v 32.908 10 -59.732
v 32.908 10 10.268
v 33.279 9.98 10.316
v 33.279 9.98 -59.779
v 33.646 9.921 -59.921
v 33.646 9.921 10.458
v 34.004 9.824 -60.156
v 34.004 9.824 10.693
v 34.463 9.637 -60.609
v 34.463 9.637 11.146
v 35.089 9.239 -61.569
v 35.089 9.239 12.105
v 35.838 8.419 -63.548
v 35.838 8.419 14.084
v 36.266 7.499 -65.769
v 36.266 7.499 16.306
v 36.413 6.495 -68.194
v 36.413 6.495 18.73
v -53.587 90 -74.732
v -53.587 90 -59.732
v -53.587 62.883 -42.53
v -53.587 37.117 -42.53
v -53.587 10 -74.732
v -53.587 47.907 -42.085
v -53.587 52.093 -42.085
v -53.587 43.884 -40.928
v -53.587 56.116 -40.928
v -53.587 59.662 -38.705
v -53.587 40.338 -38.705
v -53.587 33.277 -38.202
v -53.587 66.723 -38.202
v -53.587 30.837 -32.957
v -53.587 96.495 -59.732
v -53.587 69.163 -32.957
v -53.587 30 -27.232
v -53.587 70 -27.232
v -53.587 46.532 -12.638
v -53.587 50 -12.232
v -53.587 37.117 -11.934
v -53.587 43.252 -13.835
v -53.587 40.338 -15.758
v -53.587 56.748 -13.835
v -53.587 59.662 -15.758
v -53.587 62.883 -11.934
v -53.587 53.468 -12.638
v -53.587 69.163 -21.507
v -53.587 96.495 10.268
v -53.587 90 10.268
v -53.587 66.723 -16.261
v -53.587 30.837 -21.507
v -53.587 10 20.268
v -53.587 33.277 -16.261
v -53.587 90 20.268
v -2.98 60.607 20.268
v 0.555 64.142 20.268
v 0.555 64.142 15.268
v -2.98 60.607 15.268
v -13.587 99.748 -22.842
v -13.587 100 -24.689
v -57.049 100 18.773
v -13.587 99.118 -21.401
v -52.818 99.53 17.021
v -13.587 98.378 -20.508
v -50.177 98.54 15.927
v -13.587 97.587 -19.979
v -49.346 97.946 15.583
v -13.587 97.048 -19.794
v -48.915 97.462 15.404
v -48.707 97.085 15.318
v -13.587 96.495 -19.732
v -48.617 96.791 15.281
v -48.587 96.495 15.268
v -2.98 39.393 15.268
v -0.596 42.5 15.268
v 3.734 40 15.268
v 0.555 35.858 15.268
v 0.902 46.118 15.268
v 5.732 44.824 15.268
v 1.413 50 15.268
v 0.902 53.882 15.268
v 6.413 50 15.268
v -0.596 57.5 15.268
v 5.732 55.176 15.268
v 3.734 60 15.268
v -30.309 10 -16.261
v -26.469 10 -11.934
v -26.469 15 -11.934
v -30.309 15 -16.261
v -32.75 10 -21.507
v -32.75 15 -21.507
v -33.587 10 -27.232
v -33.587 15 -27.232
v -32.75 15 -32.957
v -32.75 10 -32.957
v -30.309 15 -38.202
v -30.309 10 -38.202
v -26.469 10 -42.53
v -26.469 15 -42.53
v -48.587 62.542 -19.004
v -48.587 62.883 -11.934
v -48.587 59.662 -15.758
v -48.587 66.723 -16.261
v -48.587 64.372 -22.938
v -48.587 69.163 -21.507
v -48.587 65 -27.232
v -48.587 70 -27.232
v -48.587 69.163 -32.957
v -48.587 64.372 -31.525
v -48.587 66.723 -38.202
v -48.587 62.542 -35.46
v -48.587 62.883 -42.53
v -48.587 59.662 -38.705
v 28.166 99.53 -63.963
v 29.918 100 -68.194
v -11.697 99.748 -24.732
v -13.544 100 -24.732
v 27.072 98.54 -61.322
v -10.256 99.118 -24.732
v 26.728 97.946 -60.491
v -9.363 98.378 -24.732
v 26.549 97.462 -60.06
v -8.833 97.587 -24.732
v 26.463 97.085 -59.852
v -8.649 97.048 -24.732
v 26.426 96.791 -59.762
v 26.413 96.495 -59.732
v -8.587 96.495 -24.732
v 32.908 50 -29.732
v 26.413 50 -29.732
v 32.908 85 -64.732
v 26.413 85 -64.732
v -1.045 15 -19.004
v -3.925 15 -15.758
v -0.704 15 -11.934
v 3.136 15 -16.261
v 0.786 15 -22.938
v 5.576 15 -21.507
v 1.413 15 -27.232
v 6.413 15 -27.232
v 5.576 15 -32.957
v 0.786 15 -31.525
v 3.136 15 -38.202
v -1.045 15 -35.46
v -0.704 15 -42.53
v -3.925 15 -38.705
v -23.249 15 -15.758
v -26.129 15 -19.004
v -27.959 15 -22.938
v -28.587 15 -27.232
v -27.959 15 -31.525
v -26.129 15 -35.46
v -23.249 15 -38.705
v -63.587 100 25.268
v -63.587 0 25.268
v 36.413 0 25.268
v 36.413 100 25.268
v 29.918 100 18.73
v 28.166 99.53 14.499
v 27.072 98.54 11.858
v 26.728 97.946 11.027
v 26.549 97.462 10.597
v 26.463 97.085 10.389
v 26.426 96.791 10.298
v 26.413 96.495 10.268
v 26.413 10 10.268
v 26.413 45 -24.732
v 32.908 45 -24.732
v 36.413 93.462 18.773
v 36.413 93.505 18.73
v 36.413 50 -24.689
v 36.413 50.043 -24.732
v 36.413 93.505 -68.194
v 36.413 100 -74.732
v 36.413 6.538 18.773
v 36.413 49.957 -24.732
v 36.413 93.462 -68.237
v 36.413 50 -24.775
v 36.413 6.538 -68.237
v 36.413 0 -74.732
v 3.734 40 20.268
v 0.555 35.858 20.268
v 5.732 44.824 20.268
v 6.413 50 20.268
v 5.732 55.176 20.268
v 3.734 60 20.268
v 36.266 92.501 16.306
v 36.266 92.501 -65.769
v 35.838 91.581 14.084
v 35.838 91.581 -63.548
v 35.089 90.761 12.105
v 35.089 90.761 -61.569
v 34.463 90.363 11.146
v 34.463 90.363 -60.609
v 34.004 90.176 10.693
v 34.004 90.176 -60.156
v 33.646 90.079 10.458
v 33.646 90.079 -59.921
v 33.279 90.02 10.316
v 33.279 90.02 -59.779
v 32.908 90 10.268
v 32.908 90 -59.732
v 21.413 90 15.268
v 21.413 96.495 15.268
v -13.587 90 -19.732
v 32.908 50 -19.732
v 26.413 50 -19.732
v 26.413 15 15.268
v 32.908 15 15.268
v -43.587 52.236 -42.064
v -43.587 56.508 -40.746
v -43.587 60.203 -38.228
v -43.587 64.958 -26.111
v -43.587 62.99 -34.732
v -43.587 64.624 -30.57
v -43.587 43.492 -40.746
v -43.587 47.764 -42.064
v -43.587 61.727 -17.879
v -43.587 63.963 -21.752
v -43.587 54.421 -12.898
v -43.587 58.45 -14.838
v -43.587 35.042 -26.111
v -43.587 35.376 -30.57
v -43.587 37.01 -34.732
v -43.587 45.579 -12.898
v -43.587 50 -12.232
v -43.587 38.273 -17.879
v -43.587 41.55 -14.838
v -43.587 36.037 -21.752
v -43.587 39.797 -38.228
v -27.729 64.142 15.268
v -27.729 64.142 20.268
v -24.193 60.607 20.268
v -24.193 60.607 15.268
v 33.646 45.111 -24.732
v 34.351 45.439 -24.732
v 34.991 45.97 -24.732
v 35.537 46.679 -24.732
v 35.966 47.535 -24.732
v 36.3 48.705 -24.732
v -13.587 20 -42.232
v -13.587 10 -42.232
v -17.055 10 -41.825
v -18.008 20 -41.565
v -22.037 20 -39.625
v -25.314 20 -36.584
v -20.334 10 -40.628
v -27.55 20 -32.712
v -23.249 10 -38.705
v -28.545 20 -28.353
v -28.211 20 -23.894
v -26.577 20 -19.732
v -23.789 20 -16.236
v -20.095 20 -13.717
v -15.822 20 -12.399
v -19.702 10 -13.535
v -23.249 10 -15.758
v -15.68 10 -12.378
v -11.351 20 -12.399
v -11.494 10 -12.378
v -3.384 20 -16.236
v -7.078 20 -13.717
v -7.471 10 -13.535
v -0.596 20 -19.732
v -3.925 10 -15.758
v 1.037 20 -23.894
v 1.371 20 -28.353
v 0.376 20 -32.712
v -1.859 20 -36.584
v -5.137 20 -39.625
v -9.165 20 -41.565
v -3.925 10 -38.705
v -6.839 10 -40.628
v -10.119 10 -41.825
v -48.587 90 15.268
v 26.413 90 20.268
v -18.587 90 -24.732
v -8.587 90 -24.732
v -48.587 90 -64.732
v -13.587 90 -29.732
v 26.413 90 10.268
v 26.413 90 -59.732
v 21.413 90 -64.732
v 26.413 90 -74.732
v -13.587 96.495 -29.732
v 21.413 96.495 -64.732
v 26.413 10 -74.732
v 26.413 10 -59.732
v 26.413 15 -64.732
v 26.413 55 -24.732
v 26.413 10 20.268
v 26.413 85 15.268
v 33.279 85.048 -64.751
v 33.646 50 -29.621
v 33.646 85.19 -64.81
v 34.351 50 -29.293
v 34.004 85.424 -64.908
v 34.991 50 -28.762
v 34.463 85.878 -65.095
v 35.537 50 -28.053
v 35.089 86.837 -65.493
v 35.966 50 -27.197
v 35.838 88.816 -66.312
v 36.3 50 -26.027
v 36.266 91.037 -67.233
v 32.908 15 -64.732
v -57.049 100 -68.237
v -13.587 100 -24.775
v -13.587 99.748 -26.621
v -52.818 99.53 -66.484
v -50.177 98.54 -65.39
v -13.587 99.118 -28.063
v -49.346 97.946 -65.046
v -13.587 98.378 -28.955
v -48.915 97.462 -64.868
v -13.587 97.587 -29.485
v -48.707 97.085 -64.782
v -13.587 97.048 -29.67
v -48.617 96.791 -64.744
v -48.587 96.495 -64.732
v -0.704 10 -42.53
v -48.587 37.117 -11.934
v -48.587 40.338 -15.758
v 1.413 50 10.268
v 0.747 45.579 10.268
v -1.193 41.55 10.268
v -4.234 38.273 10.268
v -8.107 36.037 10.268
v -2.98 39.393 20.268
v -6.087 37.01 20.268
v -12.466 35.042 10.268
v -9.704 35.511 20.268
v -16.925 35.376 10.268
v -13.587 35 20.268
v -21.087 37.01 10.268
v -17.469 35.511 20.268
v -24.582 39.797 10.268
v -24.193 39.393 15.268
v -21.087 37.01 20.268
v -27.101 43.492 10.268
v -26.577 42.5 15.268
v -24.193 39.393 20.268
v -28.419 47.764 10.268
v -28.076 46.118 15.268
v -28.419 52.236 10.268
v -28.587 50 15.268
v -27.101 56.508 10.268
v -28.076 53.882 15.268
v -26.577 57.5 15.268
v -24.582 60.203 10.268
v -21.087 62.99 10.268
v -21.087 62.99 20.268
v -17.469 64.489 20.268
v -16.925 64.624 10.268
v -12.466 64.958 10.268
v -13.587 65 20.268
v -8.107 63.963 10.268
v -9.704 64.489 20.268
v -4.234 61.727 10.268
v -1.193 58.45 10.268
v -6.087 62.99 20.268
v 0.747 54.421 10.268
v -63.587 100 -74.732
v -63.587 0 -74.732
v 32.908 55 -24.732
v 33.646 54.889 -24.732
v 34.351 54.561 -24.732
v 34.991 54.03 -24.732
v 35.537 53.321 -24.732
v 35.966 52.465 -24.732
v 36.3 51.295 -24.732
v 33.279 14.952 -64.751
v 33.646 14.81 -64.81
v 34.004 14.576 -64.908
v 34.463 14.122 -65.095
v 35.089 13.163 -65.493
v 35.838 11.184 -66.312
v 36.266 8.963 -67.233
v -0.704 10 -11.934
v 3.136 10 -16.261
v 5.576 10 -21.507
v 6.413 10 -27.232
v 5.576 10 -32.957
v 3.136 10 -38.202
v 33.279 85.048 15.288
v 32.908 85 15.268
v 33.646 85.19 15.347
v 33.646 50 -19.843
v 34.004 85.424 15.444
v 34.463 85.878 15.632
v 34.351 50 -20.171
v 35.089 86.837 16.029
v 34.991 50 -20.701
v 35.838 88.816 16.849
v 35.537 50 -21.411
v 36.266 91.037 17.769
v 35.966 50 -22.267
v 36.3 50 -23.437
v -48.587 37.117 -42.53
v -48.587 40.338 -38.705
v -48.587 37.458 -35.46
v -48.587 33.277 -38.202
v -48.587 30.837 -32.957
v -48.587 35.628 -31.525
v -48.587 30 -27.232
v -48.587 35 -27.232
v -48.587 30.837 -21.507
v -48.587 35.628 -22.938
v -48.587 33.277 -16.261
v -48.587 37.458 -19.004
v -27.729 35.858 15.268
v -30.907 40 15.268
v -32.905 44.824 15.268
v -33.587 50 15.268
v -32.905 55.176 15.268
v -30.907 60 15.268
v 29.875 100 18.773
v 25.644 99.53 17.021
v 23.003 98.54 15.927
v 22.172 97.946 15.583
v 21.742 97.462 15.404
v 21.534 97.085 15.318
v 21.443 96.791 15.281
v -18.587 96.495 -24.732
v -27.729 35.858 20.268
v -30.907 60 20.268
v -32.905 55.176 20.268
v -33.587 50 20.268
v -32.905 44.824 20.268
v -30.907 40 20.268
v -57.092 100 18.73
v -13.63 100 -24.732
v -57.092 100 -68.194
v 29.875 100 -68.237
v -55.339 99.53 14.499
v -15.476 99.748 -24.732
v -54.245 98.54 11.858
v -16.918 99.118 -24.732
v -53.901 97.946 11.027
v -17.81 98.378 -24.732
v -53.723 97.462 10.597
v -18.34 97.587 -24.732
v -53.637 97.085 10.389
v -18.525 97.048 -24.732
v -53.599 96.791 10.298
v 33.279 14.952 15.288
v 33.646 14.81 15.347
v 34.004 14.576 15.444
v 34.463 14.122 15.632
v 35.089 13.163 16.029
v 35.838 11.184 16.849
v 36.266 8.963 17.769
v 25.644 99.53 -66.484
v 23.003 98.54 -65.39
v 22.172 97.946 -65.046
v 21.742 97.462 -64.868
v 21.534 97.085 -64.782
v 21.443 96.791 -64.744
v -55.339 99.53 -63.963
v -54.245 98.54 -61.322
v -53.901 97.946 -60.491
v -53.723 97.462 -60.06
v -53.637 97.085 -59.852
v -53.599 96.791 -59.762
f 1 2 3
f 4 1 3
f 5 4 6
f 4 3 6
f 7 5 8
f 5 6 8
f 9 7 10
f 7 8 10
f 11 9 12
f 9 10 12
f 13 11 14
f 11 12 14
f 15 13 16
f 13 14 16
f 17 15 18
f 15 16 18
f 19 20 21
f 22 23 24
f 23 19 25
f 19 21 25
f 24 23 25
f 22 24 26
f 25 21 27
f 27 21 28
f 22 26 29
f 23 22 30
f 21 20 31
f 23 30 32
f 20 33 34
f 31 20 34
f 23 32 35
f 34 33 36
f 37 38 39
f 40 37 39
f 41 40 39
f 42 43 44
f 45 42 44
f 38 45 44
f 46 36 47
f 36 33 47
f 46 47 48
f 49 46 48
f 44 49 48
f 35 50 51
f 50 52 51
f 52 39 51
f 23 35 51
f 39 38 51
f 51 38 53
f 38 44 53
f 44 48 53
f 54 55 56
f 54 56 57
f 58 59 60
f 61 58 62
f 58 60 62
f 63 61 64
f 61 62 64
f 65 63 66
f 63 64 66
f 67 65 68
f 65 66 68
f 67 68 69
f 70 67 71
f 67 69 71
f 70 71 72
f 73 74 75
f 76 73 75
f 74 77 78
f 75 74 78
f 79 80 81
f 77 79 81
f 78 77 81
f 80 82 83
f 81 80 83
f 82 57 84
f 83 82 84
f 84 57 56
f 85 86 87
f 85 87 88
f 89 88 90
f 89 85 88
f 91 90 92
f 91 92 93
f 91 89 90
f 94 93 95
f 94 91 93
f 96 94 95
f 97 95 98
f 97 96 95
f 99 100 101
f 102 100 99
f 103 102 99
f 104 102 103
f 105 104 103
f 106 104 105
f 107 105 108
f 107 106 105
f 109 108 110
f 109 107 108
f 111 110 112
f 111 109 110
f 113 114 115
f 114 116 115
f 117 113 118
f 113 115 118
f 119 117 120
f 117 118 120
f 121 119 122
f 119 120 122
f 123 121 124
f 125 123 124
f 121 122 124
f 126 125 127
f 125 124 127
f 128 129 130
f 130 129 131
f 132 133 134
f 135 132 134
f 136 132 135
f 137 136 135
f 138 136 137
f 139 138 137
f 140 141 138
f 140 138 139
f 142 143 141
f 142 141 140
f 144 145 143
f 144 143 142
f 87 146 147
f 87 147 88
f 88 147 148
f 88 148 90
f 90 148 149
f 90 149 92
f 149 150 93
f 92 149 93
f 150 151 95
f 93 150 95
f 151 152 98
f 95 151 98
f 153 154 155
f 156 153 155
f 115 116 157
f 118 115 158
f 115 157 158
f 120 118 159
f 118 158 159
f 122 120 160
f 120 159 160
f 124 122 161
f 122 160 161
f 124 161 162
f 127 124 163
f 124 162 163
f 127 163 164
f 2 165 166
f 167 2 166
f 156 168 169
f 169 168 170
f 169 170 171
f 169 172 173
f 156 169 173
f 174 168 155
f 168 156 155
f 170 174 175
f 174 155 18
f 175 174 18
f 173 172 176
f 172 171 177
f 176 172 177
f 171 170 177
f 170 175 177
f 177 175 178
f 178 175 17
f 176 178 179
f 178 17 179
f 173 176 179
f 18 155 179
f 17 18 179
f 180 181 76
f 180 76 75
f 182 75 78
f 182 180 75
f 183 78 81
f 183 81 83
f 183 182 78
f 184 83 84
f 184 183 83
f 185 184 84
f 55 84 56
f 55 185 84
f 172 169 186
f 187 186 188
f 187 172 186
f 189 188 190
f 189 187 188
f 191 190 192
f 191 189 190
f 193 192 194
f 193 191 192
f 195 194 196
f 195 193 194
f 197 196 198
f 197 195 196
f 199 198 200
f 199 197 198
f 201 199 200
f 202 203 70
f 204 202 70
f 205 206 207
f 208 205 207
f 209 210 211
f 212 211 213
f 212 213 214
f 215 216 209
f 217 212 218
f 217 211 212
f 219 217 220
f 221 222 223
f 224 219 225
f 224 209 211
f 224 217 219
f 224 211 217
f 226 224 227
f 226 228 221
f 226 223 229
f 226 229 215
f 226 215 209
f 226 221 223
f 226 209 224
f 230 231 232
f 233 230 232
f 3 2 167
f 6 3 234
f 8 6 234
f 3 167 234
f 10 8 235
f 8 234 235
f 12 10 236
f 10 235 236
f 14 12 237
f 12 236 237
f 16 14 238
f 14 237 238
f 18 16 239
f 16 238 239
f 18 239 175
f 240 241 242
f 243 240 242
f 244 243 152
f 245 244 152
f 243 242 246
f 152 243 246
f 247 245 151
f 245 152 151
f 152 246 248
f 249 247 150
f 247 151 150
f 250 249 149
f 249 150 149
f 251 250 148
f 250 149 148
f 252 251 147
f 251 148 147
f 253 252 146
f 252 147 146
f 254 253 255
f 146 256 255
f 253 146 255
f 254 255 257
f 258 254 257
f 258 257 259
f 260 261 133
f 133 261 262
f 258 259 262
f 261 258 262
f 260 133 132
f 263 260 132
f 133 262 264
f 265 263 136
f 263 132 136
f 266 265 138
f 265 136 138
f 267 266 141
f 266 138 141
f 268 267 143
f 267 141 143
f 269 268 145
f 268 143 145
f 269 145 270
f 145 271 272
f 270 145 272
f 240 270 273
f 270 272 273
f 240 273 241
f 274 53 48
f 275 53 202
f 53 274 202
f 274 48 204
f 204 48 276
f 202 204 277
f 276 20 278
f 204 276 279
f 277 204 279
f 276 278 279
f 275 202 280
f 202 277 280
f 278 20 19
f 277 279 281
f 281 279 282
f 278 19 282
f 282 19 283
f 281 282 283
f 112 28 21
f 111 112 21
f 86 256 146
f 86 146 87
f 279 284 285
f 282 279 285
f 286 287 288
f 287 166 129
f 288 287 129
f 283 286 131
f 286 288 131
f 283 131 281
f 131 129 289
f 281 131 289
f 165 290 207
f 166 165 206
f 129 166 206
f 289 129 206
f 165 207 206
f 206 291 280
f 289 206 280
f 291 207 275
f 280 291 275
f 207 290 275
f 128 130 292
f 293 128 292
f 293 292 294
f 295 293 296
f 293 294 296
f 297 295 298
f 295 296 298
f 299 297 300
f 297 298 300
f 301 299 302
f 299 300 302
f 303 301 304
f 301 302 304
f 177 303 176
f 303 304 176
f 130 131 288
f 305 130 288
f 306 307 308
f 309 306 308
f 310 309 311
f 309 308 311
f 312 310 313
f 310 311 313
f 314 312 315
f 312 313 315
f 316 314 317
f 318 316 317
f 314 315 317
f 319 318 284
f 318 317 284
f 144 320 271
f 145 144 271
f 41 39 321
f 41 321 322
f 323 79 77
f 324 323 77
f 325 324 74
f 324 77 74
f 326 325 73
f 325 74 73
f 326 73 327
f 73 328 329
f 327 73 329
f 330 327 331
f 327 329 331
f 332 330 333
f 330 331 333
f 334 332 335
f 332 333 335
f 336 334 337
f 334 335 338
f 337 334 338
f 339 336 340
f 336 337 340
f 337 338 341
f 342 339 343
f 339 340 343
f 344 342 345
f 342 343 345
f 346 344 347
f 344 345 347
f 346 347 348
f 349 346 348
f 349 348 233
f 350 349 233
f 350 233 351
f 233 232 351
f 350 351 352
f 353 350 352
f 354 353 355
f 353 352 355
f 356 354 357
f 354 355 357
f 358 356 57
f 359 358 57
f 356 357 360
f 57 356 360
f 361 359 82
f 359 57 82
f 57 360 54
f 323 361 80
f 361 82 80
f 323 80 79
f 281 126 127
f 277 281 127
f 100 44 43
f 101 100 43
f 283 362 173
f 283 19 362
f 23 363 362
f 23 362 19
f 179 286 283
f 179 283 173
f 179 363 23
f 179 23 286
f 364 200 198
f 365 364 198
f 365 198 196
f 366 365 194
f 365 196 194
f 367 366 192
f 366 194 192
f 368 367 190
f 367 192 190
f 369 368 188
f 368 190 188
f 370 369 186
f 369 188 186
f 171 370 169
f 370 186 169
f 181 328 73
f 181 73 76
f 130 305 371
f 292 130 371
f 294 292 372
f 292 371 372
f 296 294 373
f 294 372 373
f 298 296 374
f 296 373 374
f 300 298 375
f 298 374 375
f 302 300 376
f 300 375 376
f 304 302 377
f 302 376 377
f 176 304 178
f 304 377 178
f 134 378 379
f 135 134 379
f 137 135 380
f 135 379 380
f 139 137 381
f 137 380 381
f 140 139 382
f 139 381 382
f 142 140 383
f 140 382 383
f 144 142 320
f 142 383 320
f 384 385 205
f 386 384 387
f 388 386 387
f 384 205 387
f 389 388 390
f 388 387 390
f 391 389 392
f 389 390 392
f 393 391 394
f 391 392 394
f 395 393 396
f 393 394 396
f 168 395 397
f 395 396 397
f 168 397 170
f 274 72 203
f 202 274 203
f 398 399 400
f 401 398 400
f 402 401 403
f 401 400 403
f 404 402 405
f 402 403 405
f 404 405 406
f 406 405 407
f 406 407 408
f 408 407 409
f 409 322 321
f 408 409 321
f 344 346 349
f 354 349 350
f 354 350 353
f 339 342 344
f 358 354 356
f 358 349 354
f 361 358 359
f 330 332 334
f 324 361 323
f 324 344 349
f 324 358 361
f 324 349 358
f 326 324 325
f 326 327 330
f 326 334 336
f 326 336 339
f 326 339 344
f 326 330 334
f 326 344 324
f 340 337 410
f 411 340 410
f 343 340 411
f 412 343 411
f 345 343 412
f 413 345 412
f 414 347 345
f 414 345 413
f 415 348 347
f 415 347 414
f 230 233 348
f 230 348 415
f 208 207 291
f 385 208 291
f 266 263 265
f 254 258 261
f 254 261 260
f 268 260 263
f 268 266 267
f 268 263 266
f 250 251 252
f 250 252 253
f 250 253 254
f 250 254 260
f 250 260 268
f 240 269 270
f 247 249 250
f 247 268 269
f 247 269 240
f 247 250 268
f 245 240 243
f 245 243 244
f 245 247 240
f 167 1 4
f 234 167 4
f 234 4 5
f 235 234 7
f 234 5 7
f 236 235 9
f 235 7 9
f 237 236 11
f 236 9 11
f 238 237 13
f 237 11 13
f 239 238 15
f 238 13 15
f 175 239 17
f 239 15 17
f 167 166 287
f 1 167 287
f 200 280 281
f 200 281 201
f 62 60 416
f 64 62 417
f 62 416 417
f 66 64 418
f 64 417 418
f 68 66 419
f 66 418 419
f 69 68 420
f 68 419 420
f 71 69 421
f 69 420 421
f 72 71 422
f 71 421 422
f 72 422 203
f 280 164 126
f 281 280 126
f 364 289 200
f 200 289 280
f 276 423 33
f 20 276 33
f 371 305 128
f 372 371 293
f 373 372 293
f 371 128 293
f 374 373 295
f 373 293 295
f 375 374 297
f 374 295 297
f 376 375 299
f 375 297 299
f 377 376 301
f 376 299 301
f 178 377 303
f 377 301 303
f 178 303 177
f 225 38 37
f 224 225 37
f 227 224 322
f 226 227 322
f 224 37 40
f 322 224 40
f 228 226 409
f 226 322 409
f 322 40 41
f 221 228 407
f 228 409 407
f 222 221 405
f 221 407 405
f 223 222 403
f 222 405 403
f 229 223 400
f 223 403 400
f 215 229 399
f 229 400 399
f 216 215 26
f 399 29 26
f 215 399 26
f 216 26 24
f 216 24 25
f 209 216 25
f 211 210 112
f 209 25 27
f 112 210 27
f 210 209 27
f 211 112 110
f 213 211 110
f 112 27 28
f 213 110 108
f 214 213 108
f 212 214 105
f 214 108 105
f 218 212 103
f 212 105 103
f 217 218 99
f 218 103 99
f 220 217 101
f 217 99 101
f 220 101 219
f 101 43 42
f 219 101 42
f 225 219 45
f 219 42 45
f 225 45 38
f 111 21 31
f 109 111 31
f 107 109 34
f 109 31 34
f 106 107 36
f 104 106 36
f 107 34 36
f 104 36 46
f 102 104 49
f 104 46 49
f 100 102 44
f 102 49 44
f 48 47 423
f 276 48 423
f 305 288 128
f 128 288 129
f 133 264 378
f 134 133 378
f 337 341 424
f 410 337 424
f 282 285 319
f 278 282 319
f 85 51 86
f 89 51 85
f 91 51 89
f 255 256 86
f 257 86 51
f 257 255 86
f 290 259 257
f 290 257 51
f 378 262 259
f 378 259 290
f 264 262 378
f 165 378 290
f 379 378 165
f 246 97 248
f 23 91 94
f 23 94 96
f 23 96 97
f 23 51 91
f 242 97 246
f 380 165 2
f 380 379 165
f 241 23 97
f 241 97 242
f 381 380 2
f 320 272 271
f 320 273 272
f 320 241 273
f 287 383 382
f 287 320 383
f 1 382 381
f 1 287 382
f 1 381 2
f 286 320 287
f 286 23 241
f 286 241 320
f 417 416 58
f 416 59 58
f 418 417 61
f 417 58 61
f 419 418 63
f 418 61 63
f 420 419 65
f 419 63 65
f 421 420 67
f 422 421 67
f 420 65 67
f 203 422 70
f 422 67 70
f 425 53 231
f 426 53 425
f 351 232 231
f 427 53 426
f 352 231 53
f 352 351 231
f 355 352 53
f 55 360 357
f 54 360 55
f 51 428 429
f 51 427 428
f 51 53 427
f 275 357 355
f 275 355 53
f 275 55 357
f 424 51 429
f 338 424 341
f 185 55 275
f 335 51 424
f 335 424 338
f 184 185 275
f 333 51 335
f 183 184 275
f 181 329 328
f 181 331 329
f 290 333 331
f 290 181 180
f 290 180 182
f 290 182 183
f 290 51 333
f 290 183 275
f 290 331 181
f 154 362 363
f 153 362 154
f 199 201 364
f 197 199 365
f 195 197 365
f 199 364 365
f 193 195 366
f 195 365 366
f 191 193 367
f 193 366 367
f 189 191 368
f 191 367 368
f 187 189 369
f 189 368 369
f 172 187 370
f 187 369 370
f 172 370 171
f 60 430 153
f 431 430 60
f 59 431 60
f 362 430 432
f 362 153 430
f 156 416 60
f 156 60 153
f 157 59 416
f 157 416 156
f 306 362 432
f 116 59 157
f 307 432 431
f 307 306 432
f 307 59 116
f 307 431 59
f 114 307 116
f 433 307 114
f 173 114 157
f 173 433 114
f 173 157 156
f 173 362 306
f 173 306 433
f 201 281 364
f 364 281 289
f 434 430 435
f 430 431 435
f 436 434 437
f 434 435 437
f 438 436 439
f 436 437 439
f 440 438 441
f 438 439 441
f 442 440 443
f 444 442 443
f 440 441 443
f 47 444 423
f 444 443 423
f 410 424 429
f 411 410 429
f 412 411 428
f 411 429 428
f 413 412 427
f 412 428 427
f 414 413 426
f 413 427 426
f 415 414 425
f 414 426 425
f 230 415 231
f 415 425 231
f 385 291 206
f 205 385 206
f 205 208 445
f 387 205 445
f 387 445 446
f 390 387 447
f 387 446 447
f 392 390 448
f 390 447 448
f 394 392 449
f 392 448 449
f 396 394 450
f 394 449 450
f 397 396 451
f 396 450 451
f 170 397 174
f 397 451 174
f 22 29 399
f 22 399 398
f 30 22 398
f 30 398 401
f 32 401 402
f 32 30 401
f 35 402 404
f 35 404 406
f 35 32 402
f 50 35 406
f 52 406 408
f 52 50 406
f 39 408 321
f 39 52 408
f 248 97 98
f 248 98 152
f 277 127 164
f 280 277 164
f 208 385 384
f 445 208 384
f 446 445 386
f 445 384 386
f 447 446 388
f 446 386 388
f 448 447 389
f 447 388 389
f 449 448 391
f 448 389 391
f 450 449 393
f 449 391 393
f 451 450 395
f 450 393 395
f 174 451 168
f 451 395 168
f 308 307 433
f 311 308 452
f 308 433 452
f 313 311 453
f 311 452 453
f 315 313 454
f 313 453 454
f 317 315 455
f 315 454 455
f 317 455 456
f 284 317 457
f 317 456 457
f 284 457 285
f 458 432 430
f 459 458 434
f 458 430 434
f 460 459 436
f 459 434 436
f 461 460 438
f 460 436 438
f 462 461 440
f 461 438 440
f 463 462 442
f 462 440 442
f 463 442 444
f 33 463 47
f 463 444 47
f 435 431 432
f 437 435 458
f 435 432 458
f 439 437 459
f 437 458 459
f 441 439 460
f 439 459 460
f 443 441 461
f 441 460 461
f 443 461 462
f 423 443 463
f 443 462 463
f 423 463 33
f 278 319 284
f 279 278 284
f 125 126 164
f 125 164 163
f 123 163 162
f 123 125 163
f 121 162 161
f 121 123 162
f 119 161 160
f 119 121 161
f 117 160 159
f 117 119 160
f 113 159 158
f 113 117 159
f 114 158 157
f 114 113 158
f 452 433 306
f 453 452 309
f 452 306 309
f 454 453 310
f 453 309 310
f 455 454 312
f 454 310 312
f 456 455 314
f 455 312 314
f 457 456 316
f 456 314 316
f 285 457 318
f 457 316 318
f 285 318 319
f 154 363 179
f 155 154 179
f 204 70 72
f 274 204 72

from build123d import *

# Parameters (mm, degrees)
SKETCH1_W            = 100
SKETCH1_H            = 100
BOSS_EXTRUDE1_DEPTH  = 100
SKETCH2_W            = 80
SKETCH2_H            = 80
CUT_EXTRUDE1_DEPTH   = 100
SKETCH3_W            = 80
SKETCH3_H            = 80
CUT_EXTRUDE2_DEPTH   = 100
CUT_EXTRUDE3_DEPTH   = 100
FILLET39_R           = 3.505
FILLET40_R           = 3.505
FILLET41_R           = 3.505
FILLET42_R           = 3.505
SKETCH5_W            = 80
SKETCH5_H            = 5
BOSS_EXTRUDE2_DEPTH  = 80
BOSS_EXTRUDE4_DEPTH  = 10
FILLET106_R          = 3.505
FILLET107_R          = 3.505
FILLET108_R          = 3.505
FILLET109_R          = 3.505
SKETCH10_W           = 100
SKETCH10_H           = 100
BOSS_EXTRUDE6_DEPTH  = 10
SKETCH11_W           = 100
SKETCH11_H           = 100
BOSS_EXTRUDE7_DEPTH  = 10
SKETCH12_R           = 15
BOSS_EXTRUDE8_DEPTH  = 10
BOSS_EXTRUDE9_DEPTH  = 5
SKETCH18_R           = 15
BOSS_EXTRUDE10_DEPTH = 10
BOSS_EXTRUDE11_DEPTH = 5
CUT_EXTRUDE4_DEPTH   = 10
SKETCH26_W           = 91.840928508
SKETCH26_H           = 89.348142656
BOSS_EXTRUDE12_DEPTH = 10
FILLET113_R          = 3.505
FILLET114_R          = 3.505
SKETCH28_R           = 15
BOSS_EXTRUDE13_DEPTH = 10
BOSS_EXTRUDE14_DEPTH = 5
FILLET115_R          = 3.505


# Some blends are built 0.0001 mm under size
with BuildPart() as part:
    # Sketch1 → Boss-Extrude1 (new body)
    with BuildSketch(Plane(origin=(0, 0, 0), x_dir=(1, 0, 0), z_dir=(0, 1, 0))):
        with Locations((-13.586701651, 24.731769861)):
            Rectangle(SKETCH1_W, SKETCH1_H)
    extrude(amount=BOSS_EXTRUDE1_DEPTH)

    # Sketch2 → Cut-Extrude1 (cut)
    with BuildSketch(Plane(origin=(0, 100, 0), x_dir=(1, 0, 0), z_dir=(0, 1, 0))):
        with Locations((-13.586701651, 24.731769861)):
            Rectangle(SKETCH2_W, SKETCH2_H)
    extrude(amount=-CUT_EXTRUDE1_DEPTH, mode=Mode.SUBTRACT)

    # Sketch3 → Cut-Extrude2 (cut)
    with BuildSketch(Plane.XY.offset(25.268230139)):
        with Locations((-13.586701651, 50)):
            Rectangle(SKETCH3_W, SKETCH3_H)
    extrude(amount=-CUT_EXTRUDE2_DEPTH, mode=Mode.SUBTRACT)

    # Sketch4 → Cut-Extrude3 (cut)
    with BuildSketch(Plane.ZY.offset(63.586701651)):
        Polygon((-59.731769861, 10), (10.268230139, 10), (-24.731769861, 45), align=None)
        Polygon((-64.731769861, 15), (-29.731769861, 50), (-64.731769861, 85), align=None)
        Polygon((-59.731769861, 90), (-24.731769861, 55), (10.268230139, 90), align=None)
        Polygon((-19.731769861, 50), (15.268230139, 15), (15.268230139, 85), align=None)
    extrude(amount=-CUT_EXTRUDE3_DEPTH, mode=Mode.SUBTRACT)

    # Fillet39
    # the kernel refuses this fillet: 3.505 mm, written as the material it adds along each edge
    with BuildSketch(Plane(origin=(-63.586701651, 45, -24.731769861), x_dir=(0, -0.7071067811865476, -0.7071067811865476), z_dir=(1, 0, 0))) as fillet39_piece_1:
        with BuildLine():
            CenterArc((FILLET39_R, -FILLET39_R), FILLET39_R, 90, 90)
            Line((0, -FILLET39_R), (0, 0))
            Line((0, 0), (FILLET39_R, 0))
        make_face()
    extrude(amount=10)
    with BuildSketch(Plane(origin=(-63.586701651, 10, 10.268230139), x_dir=(0, 0, -1), z_dir=(1, 0, 0))) as fillet39_piece_2:
        with BuildLine():
            CenterArc((FILLET39_R * 2.41421356237, FILLET39_R), FILLET39_R, 135, 135)
            Line((FILLET39_R * 1.70710678119, FILLET39_R * 1.70710678119), (0, 0))
            Line((0, 0), (FILLET39_R * 2.41421356237, 0))
        make_face()
    extrude(amount=10)
    # the kernel refuses this fillet: 3.505 mm, written as the material it takes off along each edge
    with BuildSketch(Plane(origin=(-63.586701651, 15.983409268, 4.284820871), x_dir=(0, 0.7071067811865476, 0.7071067811865476), z_dir=(0, 0.7071067811865475, -0.7071067811865476)), Plane(origin=(-53.586701651, 42.521590732, -22.253360593), x_dir=(0, 0.7071067811865476, 0.7071067811865476), z_dir=(0, -0.7071067811865475, 0.7071067811865476))) as fillet39_2_piece_1:
        with BuildLine():
            CenterArc((FILLET39_R, FILLET39_R), FILLET39_R, 180, 90)
            Line((0, FILLET39_R), (0, 0))
            Line((0, 0), (FILLET39_R, 0))
        make_face()
    extrude(amount=37.530656147, mode=Mode.SUBTRACT)
    with BuildSketch(Plane(origin=(-63.586701651, 10, -68.494269861), x_dir=(0, -1, 0), z_dir=(0, 0, 1))) as fillet39_2_piece_2_section:
        with BuildLine():
            CenterArc((FILLET39_R, FILLET39_R), FILLET39_R, 180, 90)
            Line((0, FILLET39_R), (0, 0))
            Line((0, 0), (FILLET39_R, 0))
        make_face()
    fillet39_2_piece_2 = extrude(amount=70.300681464, mode=Mode.PRIVATE)
    fillet39_2_piece_2 = split(fillet39_2_piece_2, bisect_by=Plane(origin=(-62.798598249, 24.782539109, -44.949230752), z_dir=(0, -0.7071067811865476, 0.7071067811865476)), keep=Keep.TOP, mode=Mode.PRIVATE)
    add(fillet39_2_piece_2, mode=Mode.SUBTRACT)
    with BuildSketch(Plane(origin=(-53.586701651, 3.80397683, -65.927793031), x_dir=(0, 0.7071067811865475, -0.7071067811865475), z_dir=(0, 0.7071067811865476, 0.7071067811865476))) as fillet39_2_piece_3_section:
        with BuildLine():
            CenterArc((FILLET39_R, FILLET39_R), FILLET39_R, 180, 90)
            Line((0, FILLET39_R), (0, 0))
            Line((0, 0), (FILLET39_R, 0))
        make_face()
    fillet39_2_piece_3 = extrude(amount=54.754974683, mode=Mode.PRIVATE)
    fillet39_2_piece_3 = split(fillet39_2_piece_3, bisect_by=Plane(origin=(-54.373006967, 10, -44.325568199), z_dir=(0, 1, 0)), keep=Keep.TOP, mode=Mode.PRIVATE)
    add(fillet39_2_piece_3, mode=Mode.SUBTRACT)
    with BuildSketch(Plane(origin=(-53.586701651, 10, 1.806411603), x_dir=(0, -1, 0), z_dir=(0, 0, -1))) as fillet39_2_piece_4_section:
        with BuildLine():
            CenterArc((FILLET39_R, FILLET39_R), FILLET39_R, 180, 90)
            Line((0, FILLET39_R), (0, 0))
            Line((0, 0), (FILLET39_R, 0))
        make_face()
    fillet39_2_piece_4 = extrude(amount=70.300681464, mode=Mode.PRIVATE)
    fillet39_2_piece_4 = split(fillet39_2_piece_4, bisect_by=Plane(origin=(-54.374805052, 24.782539109, -44.949230752), z_dir=(0, -0.7071067811865476, 0.7071067811865476)), keep=Keep.TOP, mode=Mode.PRIVATE)
    add(fillet39_2_piece_4, mode=Mode.SUBTRACT)
    with BuildSketch(Plane(origin=(-63.586701651, 42.521590732, -27.210179129), x_dir=(0, 0.7071067811865476, -0.7071067811865476), z_dir=(0, -0.7071067811865476, -0.7071067811865476))) as fillet39_2_piece_5_section:
        with BuildLine():
            CenterArc((FILLET39_R, FILLET39_R), FILLET39_R, 180, 90)
            Line((0, FILLET39_R), (0, 0))
            Line((0, 0), (FILLET39_R, 0))
        make_face()
    fillet39_2_piece_5 = extrude(amount=54.754974683, mode=Mode.PRIVATE)
    fillet39_2_piece_5 = split(fillet39_2_piece_5, bisect_by=Plane(origin=(-62.800396334, 10, -44.325568199), z_dir=(0, 1, 0)), keep=Keep.TOP, mode=Mode.PRIVATE)
    add(fillet39_2_piece_5, mode=Mode.SUBTRACT)
    with BuildSketch(Plane(origin=(-63.586701651, 40.043181464, -24.731769861), x_dir=(0, 0.7071067811865476, -0.7071067811865476), z_dir=(0, -0.7071067811865476, -0.7071067811865476))) as fillet39_2_piece_6:
        with BuildLine():
            CenterArc((3.505 + FILLET39_R, FILLET39_R), FILLET39_R, 180, 90)
            Line((3.505, FILLET39_R), (3.505, 0))
            Line((3.505, 0), (3.505 + FILLET39_R, 0))
        make_face()
    revolve(axis=Axis((-63.586701651, 40.043181464, -24.731769861), (1, 0, 0)), revolution_arc=90, mode=Mode.SUBTRACT)
    with BuildSketch(Plane(origin=(-53.586701651, 13.505, 1.806411603), x_dir=(0, -1, 0), z_dir=(0, 0, -1))) as fillet39_2_piece_7:
        with BuildLine():
            CenterArc((3.505 + FILLET39_R, FILLET39_R), FILLET39_R, 180, 90)
            Line((3.505, FILLET39_R), (3.505, 0))
            Line((3.505, 0), (3.505 + FILLET39_R, 0))
        make_face()
    revolve(axis=Axis((-53.586701651, 13.505, 1.806411603), (-1, 0, 0)), revolution_arc=135, mode=Mode.SUBTRACT)
    with BuildSketch(Plane(origin=(-53.586701651, 40.043181464, -24.731769861), x_dir=(0, 0.7071067811865476, -0.7071067811865476), z_dir=(0, -0.7071067811865476, -0.7071067811865476))) as fillet39_2_piece_8:
        with BuildLine():
            CenterArc((3.505 + FILLET39_R, -FILLET39_R), FILLET39_R, 90, 90)
            Line((3.505, -FILLET39_R), (3.505, 0))
            Line((3.505, 0), (3.505 + FILLET39_R, 0))
        make_face()
    revolve(axis=Axis((-53.586701651, 40.043181464, -24.731769861), (1, 0, 0)), revolution_arc=90, mode=Mode.SUBTRACT)
    with BuildSketch(Plane(origin=(-63.586701651, 13.505, 1.806411603), x_dir=(0, -1, 0), z_dir=(0, 0, -1))) as fillet39_2_piece_9:
        with BuildLine():
            CenterArc((3.505 + FILLET39_R, -FILLET39_R), FILLET39_R, 90, 90)
            Line((3.505, -FILLET39_R), (3.505, 0))
            Line((3.505, 0), (3.505 + FILLET39_R, 0))
        make_face()
    revolve(axis=Axis((-63.586701651, 13.505, 1.806411603), (-1, 0, 0)), revolution_arc=135, mode=Mode.SUBTRACT)
    with BuildSketch(Plane(origin=(-63.586701651, 42.521590732, -27.210179129), x_dir=(0, 0.7071067811865476, -0.7071067811865476), z_dir=(0, -0.7071067811865476, -0.7071067811865476))) as fillet39_2_piece_10a_section:
        with BuildLine():
            CenterArc((FILLET39_R, FILLET39_R), FILLET39_R, 180, 90)
            Line((0, FILLET39_R), (0, 0))
            Line((0, 0), (FILLET39_R, 0))
        make_face()
    fillet39_2_piece_10a = extrude(amount=54.754974683, mode=Mode.PRIVATE)
    fillet39_2_piece_10a = split(fillet39_2_piece_10a, bisect_by=Plane(origin=(-62.750859381, 10, -63.595436252), z_dir=(0, -1, 0)), keep=Keep.TOP, mode=Mode.PRIVATE)
    with BuildSketch(Plane(origin=(-63.586701651, 10, -68.494269861), x_dir=(0, -1, 0), z_dir=(0, 0, 1))) as fillet39_2_piece_10b_section:
        with BuildLine():
            CenterArc((FILLET39_R, FILLET39_R), FILLET39_R, 180, 90)
            Line((0, FILLET39_R), (0, 0))
            Line((0, 0), (FILLET39_R, 0))
        make_face()
    fillet39_2_piece_10b = extrude(amount=70.300681464, mode=Mode.PRIVATE)
    fillet39_2_piece_10b = split(fillet39_2_piece_10b, bisect_by=Plane(origin=(-62.750859381, 7.267975294, -62.463794567), z_dir=(0, 0.7071067811865476, -0.7071067811865476)), keep=Keep.TOP, mode=Mode.PRIVATE)
    fillet39_2_piece_10 = fillet39_2_piece_10a & fillet39_2_piece_10b
    add(fillet39_2_piece_10, mode=Mode.SUBTRACT)
    with BuildSketch(Plane(origin=(-53.586701651, 3.80397683, -65.927793031), x_dir=(0, 0.7071067811865475, -0.7071067811865475), z_dir=(0, 0.7071067811865476, 0.7071067811865476))) as fillet39_2_piece_11a_section:
        with BuildLine():
            CenterArc((FILLET39_R, FILLET39_R), FILLET39_R, 180, 90)
            Line((0, FILLET39_R), (0, 0))
            Line((0, 0), (FILLET39_R, 0))
        make_face()
    fillet39_2_piece_11a = extrude(amount=54.754974683, mode=Mode.PRIVATE)
    fillet39_2_piece_11a = split(fillet39_2_piece_11a, bisect_by=Plane(origin=(-54.503230396, 7.913859932, -64.731769861), z_dir=(0, 0, 1)), keep=Keep.TOP, mode=Mode.PRIVATE)
    fillet39_2_piece_11a = split(fillet39_2_piece_11a, bisect_by=Plane(origin=(-54.503230396, 10, -62.645629793), z_dir=(0, -1, 0)), keep=Keep.TOP, mode=Mode.PRIVATE)
    with BuildSketch(Plane(origin=(-53.586701651, 10, 1.806411603), x_dir=(0, -1, 0), z_dir=(0, 0, -1))) as fillet39_2_piece_11b_section:
        with BuildLine():
            CenterArc((FILLET39_R, FILLET39_R), FILLET39_R, 180, 90)
            Line((0, FILLET39_R), (0, 0))
            Line((0, 0), (FILLET39_R, 0))
        make_face()
    fillet39_2_piece_11b = extrude(amount=70.300681464, mode=Mode.PRIVATE)
    fillet39_2_piece_11b = split(fillet39_2_piece_11b, bisect_by=Plane(origin=(-54.460403752, 9.342219977, -64.731769861), z_dir=(0, 0, 1)), keep=Keep.TOP, mode=Mode.PRIVATE)
    fillet39_2_piece_11b = split(fillet39_2_piece_11b, bisect_by=Plane(origin=(-54.460403752, 8.256664983, -61.475104878), z_dir=(0, 0.7071067811865476, -0.7071067811865476)), keep=Keep.TOP, mode=Mode.PRIVATE)
    fillet39_2_piece_11 = fillet39_2_piece_11a & fillet39_2_piece_11b
    add(fillet39_2_piece_11, mode=Mode.SUBTRACT)

    # Fillet40
    fillet40_edges = [part.edges().sort_by_distance(p)[0] for p in [
        (-63.586701651, 72.5, -42.231769861),
        (-58.586701651, 90, -59.731769861),
        (-63.586701651, 90, -24.731769861),
        (-53.586701651, 72.5, -7.231769861),
        (-58.586701651, 90, 10.268230139),
        (-53.586701651, 72.5, -42.231769861),
        (-53.586701651, 90, -24.731769861),
        (-63.586701651, 72.5, -7.231769861),
    ]]
    fillet(fillet40_edges, radius=FILLET40_R)

    # Fillet41
    fillet41_edges = [part.edges().sort_by_distance(p)[0] for p in [
        (-58.586701651, 85, 15.268230139),
        (-63.586701651, 50, 15.268230139),
        (-58.586701651, 15, 15.268230139),
        (-63.586701651, 32.5, -2.231769861),
        (-53.586701651, 67.5, -2.231769861),
        (-53.586701651, 50, 15.268230139),
        (-53.586701651, 32.5, -2.231769861),
        (-63.586701651, 67.5, -2.231769861),
    ]]
    fillet(fillet41_edges, radius=FILLET41_R - 0.0001)  # a hair under: the kernel refuses the full size

    # Fillet42
    # the kernel refuses this fillet: 3.505 mm, written as the material it adds along each edge
    with BuildSketch(Plane(origin=(-63.586701651, 85, -64.731769861), x_dir=(0, -1, 0), z_dir=(1, 0, 0))) as fillet42_piece_1:
        with BuildLine():
            CenterArc((FILLET42_R * 2.41421356237, -FILLET42_R), FILLET42_R, 90, 135)
            Line((FILLET42_R * 1.70710678119, -FILLET42_R * 1.70710678119), (0, 0))
            Line((0, 0), (FILLET42_R * 2.41421356237, 0))
        make_face()
    extrude(amount=10)
    with BuildSketch(Plane(origin=(-63.586701651, 50, -29.731769861), x_dir=(0, 0.7071067811865465, -0.7071067811865486), z_dir=(1, 0, 0))) as fillet42_piece_2:
        with BuildLine():
            CenterArc((FILLET42_R, -FILLET42_R), FILLET42_R, 90, 90)
            Line((0, -FILLET42_R), (0, 0))
            Line((0, 0), (FILLET42_R, 0))
        make_face()
    extrude(amount=10)
    # the kernel refuses this fillet: 3.505 mm, written as the material it takes off along each edge
    with BuildSketch(Plane(origin=(-63.586701651, 76.538181464, -64.731769861), x_dir=(0, 0, -1), z_dir=(0, -1, 0))) as fillet42_2_piece_1_section:
        with BuildLine():
            CenterArc((FILLET42_R, FILLET42_R), FILLET42_R, 180, 90)
            Line((0, FILLET42_R), (0, 0))
            Line((0, 0), (FILLET42_R, 0))
        make_face()
    fillet42_2_piece_1 = extrude(amount=70.300681464, mode=Mode.PRIVATE)
    fillet42_2_piece_1 = split(fillet42_2_piece_1, bisect_by=Plane(origin=(-62.798598249, 29.782539109, -49.949230752), z_dir=(0, 0.7071067811865477, -0.7071067811865475)), keep=Keep.TOP, mode=Mode.PRIVATE)
    add(fillet42_2_piece_1, mode=Mode.SUBTRACT)
    with BuildSketch(Plane(origin=(-63.586701651, 52.478409268, -32.210179129), x_dir=(-5.270787768833835e-14, 0.7071067811865476, 0.7071067811865474), z_dir=(0, 0.7071067811865475, -0.7071067811865476)), Plane(origin=(-53.586701651, 79.016590732, -58.748360593), x_dir=(-5.473510375327444e-14, 0.7071067811865476, 0.7071067811865474), z_dir=(0, -0.7071067811865475, 0.7071067811865476))) as fillet42_2_piece_2:
        with BuildLine():
            CenterArc((FILLET42_R, FILLET42_R), FILLET42_R, 180, 90)
            Line((0, FILLET42_R), (0, 0))
            Line((0, 0), (FILLET42_R, 0))
        make_face()
    extrude(amount=37.530656147, mode=Mode.SUBTRACT)
    with BuildSketch(Plane(origin=(-53.586701651, 47.521590732, -32.210179129), x_dir=(-1, 0, 0), z_dir=(0, -0.7071067811865475, -0.7071067811865477))) as fillet42_2_piece_3_section:
        with BuildLine():
            CenterArc((FILLET42_R, -FILLET42_R), FILLET42_R, 90, 90)
            Line((0, -FILLET42_R), (0, 0))
            Line((0, 0), (FILLET42_R, 0))
        make_face()
    fillet42_2_piece_3 = extrude(amount=54.754974683, mode=Mode.PRIVATE)
    fillet42_2_piece_3 = split(fillet42_2_piece_3, bisect_by=Plane(origin=(-54.373006967, 30.406201662, -64.731769861), z_dir=(0, 0, 1)), keep=Keep.TOP, mode=Mode.PRIVATE)
    add(fillet42_2_piece_3, mode=Mode.SUBTRACT)
    with BuildSketch(Plane(origin=(-53.586701651, 6.2375, -64.731769861), x_dir=(0, 0, -1), z_dir=(0, 1, 0))) as fillet42_2_piece_4_section:
        with BuildLine():
            CenterArc((FILLET42_R, FILLET42_R), FILLET42_R, 180, 90)
            Line((0, FILLET42_R), (0, 0))
            Line((0, 0), (FILLET42_R, 0))
        make_face()
    fillet42_2_piece_4 = extrude(amount=70.300681464, mode=Mode.PRIVATE)
    fillet42_2_piece_4 = split(fillet42_2_piece_4, bisect_by=Plane(origin=(-54.374805052, 29.782539109, -49.949230752), z_dir=(0, 0.7071067811865477, -0.7071067811865475)), keep=Keep.TOP, mode=Mode.PRIVATE)
    add(fillet42_2_piece_4, mode=Mode.SUBTRACT)
    with BuildSketch(Plane(origin=(-63.586701651, 8.80397683, -70.927793031), x_dir=(0, -0.7071067811865476, 0.7071067811865474), z_dir=(0, 0.7071067811865475, 0.7071067811865477))) as fillet42_2_piece_5_section:
        with BuildLine():
            CenterArc((FILLET42_R, FILLET42_R), FILLET42_R, 180, 90)
            Line((0, FILLET42_R), (0, 0))
            Line((0, 0), (FILLET42_R, 0))
        make_face()
    fillet42_2_piece_5 = extrude(amount=54.754974683, mode=Mode.PRIVATE)
    fillet42_2_piece_5 = split(fillet42_2_piece_5, bisect_by=Plane(origin=(-62.800396334, 30.406201662, -64.731769861), z_dir=(0, 0, 1)), keep=Keep.TOP, mode=Mode.PRIVATE)
    add(fillet42_2_piece_5, mode=Mode.SUBTRACT)
    with BuildSketch(Plane(origin=(-63.586701651, 50, -34.688588397), x_dir=(0, 0.7071067811865476, 0.7071067811865476), z_dir=(0, 0.7071067811865476, -0.7071067811865476))) as fillet42_2_piece_6:
        with BuildLine():
            CenterArc((3.505 + FILLET42_R, FILLET42_R), FILLET42_R, 180, 90)
            Line((3.505, FILLET42_R), (3.505, 0))
            Line((3.505, 0), (3.505 + FILLET42_R, 0))
        make_face()
    revolve(axis=Axis((-63.586701651, 50, -34.688588397), (1, 0, 0)), revolution_arc=90, mode=Mode.SUBTRACT)
    with BuildSketch(Plane(origin=(-53.586701651, 76.538181464, -61.226769861), x_dir=(0, 0, -1), z_dir=(0, -1, 0))) as fillet42_2_piece_7:
        with BuildLine():
            CenterArc((3.505 + FILLET42_R, -FILLET42_R), FILLET42_R, 90, 90)
            Line((3.505, -FILLET42_R), (3.505, 0))
            Line((3.505, 0), (3.505 + FILLET42_R, 0))
        make_face()
    revolve(axis=Axis((-53.586701651, 76.538181464, -61.226769861), (1, 0, 0)), revolution_arc=135, mode=Mode.SUBTRACT)
    with BuildSketch(Plane(origin=(-53.586701651, 50, -34.688588397), x_dir=(0, 0.7071067811865476, 0.7071067811865476), z_dir=(0, 0.7071067811865476, -0.7071067811865476))) as fillet42_2_piece_8:
        with BuildLine():
            CenterArc((3.505 + FILLET42_R, -FILLET42_R), FILLET42_R, 90, 90)
            Line((3.505, -FILLET42_R), (3.505, 0))
            Line((3.505, 0), (3.505 + FILLET42_R, 0))
        make_face()
    revolve(axis=Axis((-53.586701651, 50, -34.688588397), (1, 0, 0)), revolution_arc=90, mode=Mode.SUBTRACT)
    with BuildSketch(Plane(origin=(-63.586701651, 76.538181464, -61.226769861), x_dir=(0, 0, -1), z_dir=(0, -1, 0))) as fillet42_2_piece_9:
        with BuildLine():
            CenterArc((3.505 + FILLET42_R, FILLET42_R), FILLET42_R, 180, 90)
            Line((3.505, FILLET42_R), (3.505, 0))
            Line((3.505, 0), (3.505 + FILLET42_R, 0))
        make_face()
    revolve(axis=Axis((-63.586701651, 76.538181464, -61.226769861), (1, 0, 0)), revolution_arc=135, mode=Mode.SUBTRACT)
    with BuildSketch(Plane(origin=(-63.586701651, 76.538181464, -64.731769861), x_dir=(0, 0, -1), z_dir=(0, -1, 0))) as fillet42_2_piece_10a_section:
        with BuildLine():
            CenterArc((FILLET42_R, FILLET42_R), FILLET42_R, 180, 90)
            Line((0, FILLET42_R), (0, 0))
            Line((0, 0), (FILLET42_R, 0))
        make_face()
    fillet42_2_piece_10a = extrude(amount=70.300681464, mode=Mode.PRIVATE)
    fillet42_2_piece_10a = split(fillet42_2_piece_10a, bisect_by=Plane(origin=(-62.750859381, 12.267975294, -67.463794567), z_dir=(0, -0.7071067811865477, 0.7071067811865475)), keep=Keep.TOP, mode=Mode.PRIVATE)
    with BuildSketch(Plane(origin=(-63.586701651, 8.80397683, -70.927793031), x_dir=(0, -0.7071067811865476, 0.7071067811865474), z_dir=(0, 0.7071067811865475, 0.7071067811865477))) as fillet42_2_piece_10b_section:
        with BuildLine():
            CenterArc((FILLET42_R, FILLET42_R), FILLET42_R, 180, 90)
            Line((0, FILLET42_R), (0, 0))
            Line((0, 0), (FILLET42_R, 0))
        make_face()
    fillet42_2_piece_10b = extrude(amount=54.754974683, mode=Mode.PRIVATE)
    fillet42_2_piece_10b = split(fillet42_2_piece_10b, bisect_by=Plane(origin=(-62.750859381, 11.136333609, -64.731769861), z_dir=(0, 0, -1)), keep=Keep.TOP, mode=Mode.PRIVATE)
    fillet42_2_piece_10 = fillet42_2_piece_10a & fillet42_2_piece_10b
    add(fillet42_2_piece_10, mode=Mode.SUBTRACT)
    with BuildSketch(Plane(origin=(-53.586701651, 47.521590732, -32.210179129), x_dir=(-1, 0, 0), z_dir=(0, -0.7071067811865475, -0.7071067811865477))) as fillet42_2_piece_11a_section:
        with BuildLine():
            CenterArc((FILLET42_R, -FILLET42_R), FILLET42_R, 90, 90)
            Line((0, -FILLET42_R), (0, 0))
            Line((0, 0), (FILLET42_R, 0))
        make_face()
    fillet42_2_piece_11a = extrude(amount=54.754974683, mode=Mode.PRIVATE)
    fillet42_2_piece_11a = split(fillet42_2_piece_11a, bisect_by=Plane(origin=(-54.503230396, 12.086140068, -64.731769861), z_dir=(0, 0, -1)), keep=Keep.TOP, mode=Mode.PRIVATE)
    fillet42_2_piece_11a = split(fillet42_2_piece_11a, bisect_by=Plane(origin=(-54.503230396, 10, -66.817909929), z_dir=(0, 1, 0)), keep=Keep.TOP, mode=Mode.PRIVATE)
    with BuildSketch(Plane(origin=(-53.586701651, 6.2375, -64.731769861), x_dir=(0, 0, -1), z_dir=(0, 1, 0))) as fillet42_2_piece_11b_section:
        with BuildLine():
            CenterArc((FILLET42_R, FILLET42_R), FILLET42_R, 180, 90)
            Line((0, FILLET42_R), (0, 0))
            Line((0, 0), (FILLET42_R, 0))
        make_face()
    fillet42_2_piece_11b = extrude(amount=70.300681464, mode=Mode.PRIVATE)
    fillet42_2_piece_11b = split(fillet42_2_piece_11b, bisect_by=Plane(origin=(-54.031936123, 13.371370658, -66.360399203), z_dir=(0, -0.7071067811865477, 0.7071067811865475)), keep=Keep.TOP, mode=Mode.PRIVATE)
    fillet42_2_piece_11b = split(fillet42_2_piece_11b, bisect_by=Plane(origin=(-54.031936123, 10, -65.671792575), z_dir=(0, 1, 0)), keep=Keep.TOP, mode=Mode.PRIVATE)
    fillet42_2_piece_11b = fillet42_2_piece_11b - Plane(origin=(-57.091701651, 10.849779926, -63.838808471), x_dir=(0, 0.7071067811865476, -0.7071067811865476), z_dir=(0, -0.7071067811865476, -0.7071067811865476)) * Cylinder(3.505, 155, mode=Mode.PRIVATE)
    fillet42_2_piece_11 = fillet42_2_piece_11a & fillet42_2_piece_11b
    add(fillet42_2_piece_11, mode=Mode.SUBTRACT)

    # Sketch5 → Boss-Extrude2 (add)
    with BuildSketch(Plane(origin=(0, 10, 0), x_dir=(1, 0, 0), z_dir=(0, 1, 0))):
        with Locations((-13.586701651, -22.768230139)):
            Rectangle(SKETCH5_W, SKETCH5_H)
    extrude(amount=BOSS_EXTRUDE2_DEPTH)

    # Sketch9 → Boss-Extrude4 (add)
    with BuildSketch(Plane(origin=(0, 100, 0), x_dir=(1, 0, 0), z_dir=(0, 1, 0))):
        Polygon((-13.529146595, 19.789324917), (-8.529146595, 24.789324917), (-13.536340977, 29.782130535), (-18.536340977, 24.782130535), align=None)
        Polygon((-18.536340977, 24.782130535), (-13.536340977, 29.782130535), (-48.586701651, 64.731769861), (-53.586701651, 64.731769861), (-53.586701651, 59.731769861), align=None)
        Polygon((-48.586701651, -15.268230139), (-13.529146595, 19.789324917), (-18.536340977, 24.782130535), (-53.586701651, -10.268230139), (-53.586701651, -15.268230139), align=None)
        Polygon((21.413298349, -15.052708789), (26.413298349, -15.052708789), (26.413298349, -10.052708789), (-8.529146595, 24.789324917), (-13.529146595, 19.789324917), align=None)
        Polygon((-13.536340977, 29.782130535), (-8.529146595, 24.789324917), (26.413298349, 59.731769861), (26.413298349, 64.731769861), (21.413298349, 64.731769861), align=None)
    boss_extrude4 = extrude(amount=-BOSS_EXTRUDE4_DEPTH)

    # Fillet106
    fillet106_edges = [part.edges().sort_by_distance(p)[0] for p in [
        (-13.586701651, 100, -64.731769861),
    ]]
    fillet(fillet106_edges, radius=FILLET106_R)

    # Fillet107
    fillet107_edges = [part.edges().sort_by_distance(p)[0] for p in [
        (26.413298349, 100, -24.839530536),
        (5.690978686, 100, -49.009450198),
        (-32.819071843, 100, -49.009450198),
        (-53.586701651, 100, -24.731769861),
        (-36.061521314, 100, -42.256950198),
        (-36.061521314, 100, -7.256950198),
        (-31.057924123, 100, -2.260547389),
        (3.942075877, 100, -2.368308064),
        (8.942075877, 100, -42.260547389),
        (8.942075877, 100, -7.368308064),
    ]]
    fillet(fillet107_edges, radius=FILLET107_R)

    # Fillet108
    fillet108_edges = [part.edges().sort_by_distance(p)[0] for p in [
        (-13.565110919, 100, 15.268230139),
    ]]
    fillet(fillet108_edges, radius=FILLET108_R)

    # Mirror3: Boss-Extrude4 across plane
    add(boss_extrude4.mirror(Plane.ZX.offset(50)))

    # Fillet109
    fillet109_edges = [part.edges().sort_by_distance(p)[0] for p in [
        (-11.086701651, 0, 15.268230139),
        (-13.586701651, 0, -64.731769861),
        (-53.586701651, 0, -24.731769861),
        (26.413298349, 0, -24.839530536),
        (8.942075877, 0, -42.260547389),
        (-36.061521314, 0, -42.256950198),
        (-31.057924123, 0, -2.260547389),
        (3.942075877, 0, -2.368308064),
        (8.942075877, 0, -7.368308064),
        (-36.061521314, 0, -7.256950198),
        (-31.061521314, 0, -47.256950198),
        (3.938478686, 0, -47.256950198),
    ]]
    fillet(fillet109_edges, radius=FILLET109_R)

    # Sketch10 → Boss-Extrude6 (add)
    with BuildSketch(Plane(origin=(0, 0, 0), x_dir=(-1, 0, 0), z_dir=(0, -1, 0))):
        with Locations((13.586701651, 24.731769861)):
            Rectangle(SKETCH10_W, SKETCH10_H)
    extrude(amount=-BOSS_EXTRUDE6_DEPTH)

    # Sketch11 → Boss-Extrude7 (add)
    with BuildSketch(Plane(origin=(0, 100, 0), x_dir=(1, 0, 0), z_dir=(0, 1, 0))):
        with Locations((-13.586701651, 24.731769861)):
            Rectangle(SKETCH11_W, SKETCH11_H)
    extrude(amount=-BOSS_EXTRUDE7_DEPTH)

    # Sketch12 → Boss-Extrude8 (add)
    with BuildSketch(Plane(origin=(0, 0, 20.268230139), x_dir=(-1, 0, 0), z_dir=(0, 0, -1))):
        with Locations(Location((13.586701651, 50, 0), (0, 0, 180))):
            Circle(SKETCH12_R)
    extrude(amount=BOSS_EXTRUDE8_DEPTH)

    # Sketch13 → Boss-Extrude9 (add)
    with BuildSketch(Plane(origin=(0, 0, 20.268230139), x_dir=(-1, 0, 0), z_dir=(0, 0, -1))):
        with BuildLine():
            Line((-0.555433973, 64.142135624), (2.980099933, 60.606601718))
            ThreePointArc((2.980099933, 60.606601718), (-1.413298349, 50), (2.980099933, 39.393398282))
            Line((2.980099933, 39.393398282), (-0.555433973, 35.857864376))
            ThreePointArc((-0.555433973, 35.857864376), (-6.413298349, 50), (-0.555433973, 64.142135624))
        make_face()
        with BuildLine():
            Line((27.728837274, 64.142135624), (24.193303368, 60.606601718))
            ThreePointArc((24.193303368, 60.606601718), (28.586701651, 50), (24.193303368, 39.393398282))
            Line((24.193303368, 39.393398282), (27.728837274, 35.857864376))
            ThreePointArc((27.728837274, 35.857864376), (33.586701651, 50), (27.728837274, 64.142135624))
        make_face()
    extrude(amount=BOSS_EXTRUDE9_DEPTH)

    # Sketch18 → Boss-Extrude10 (add)
    with BuildSketch(Plane(origin=(0, 10, 0), x_dir=(1, 0, 0), z_dir=(0, 1, 0))):
        with Locations(Location((-13.586701651, 27.231769861, 0), (0, 0, 90))):
            Circle(SKETCH18_R)
    extrude(amount=BOSS_EXTRUDE10_DEPTH)

    # Sketch19 → Boss-Extrude11 (add)
    with BuildSketch(Plane(origin=(0, 10, 0), x_dir=(1, 0, 0), z_dir=(0, 1, 0))):
        with BuildLine():
            Line((-26.469416566, 42.529993823), (-23.248737837, 38.705437833))
            ThreePointArc((-23.248737837, 38.705437833), (-28.586701651, 27.231769861), (-23.248737837, 15.758101889))
            Line((-23.248737837, 15.758101889), (-26.469416566, 11.933545899))
            ThreePointArc((-26.469416566, 11.933545899), (-33.586701651, 27.231769861), (-26.469416566, 42.529993823))
        make_face()
        with BuildLine():
            Line((-3.924665464, 15.758101889), (-0.703986735, 11.933545899))
            ThreePointArc((-0.703986735, 11.933545899), (6.413298349, 27.231769861), (-0.703986735, 42.529993823))
            Line((-0.703986735, 42.529993823), (-3.924665464, 38.705437833))
            ThreePointArc((-3.924665464, 38.705437833), (1.413298349, 27.231769861), (-3.924665464, 15.758101889))
        make_face()
    extrude(amount=BOSS_EXTRUDE11_DEPTH)

    # Sketch25 → Cut-Extrude4 (cut)
    with BuildSketch(Plane(origin=(0, 100, 0), x_dir=(1, 0, 0), z_dir=(0, 1, 0))):
        Polygon((26.413298349, 59.731769861), (-8.586701651, 24.731769861), (26.413298349, -10.268230139), align=None)
        Polygon((21.413298349, -15.268230139), (-13.586701651, 19.731769861), (-48.586701651, -15.268230139), align=None)
        Polygon((-18.586701651, 24.731769861), (-53.586701651, 59.731769861), (-53.586701651, -10.268230139), align=None)
        Polygon((21.413298349, 64.731769861), (-48.586701651, 64.731769861), (-13.586701651, 29.731769861), align=None)
    extrude(amount=-CUT_EXTRUDE4_DEPTH, mode=Mode.SUBTRACT)

    # Sketch26 → Boss-Extrude12 (add)
    with BuildSketch(Plane.ZY.offset(63.586701651)):
        with Locations((-24.385211709, 50.758041136)):
            Rectangle(SKETCH26_W, SKETCH26_H)
    extrude(amount=-BOSS_EXTRUDE12_DEPTH)

    # Fillet113
    fillet113_edges = [part.edges().sort_by_distance(p)[0] for p in [
        (26.413298349, 100, -24.731769861),
    ]]
    fillet(fillet113_edges, radius=FILLET113_R)

    # Fillet114
    fillet114_edges = [part.edges().sort_by_distance(p)[0] for p in [
        (36.413298349, 72.5, -7.231769861),
        (36.413298349, 72.5, -42.231769861),
        (36.413298349, 90, -24.731769861),
        (36.413298349, 67.5, -2.231769861),
        (36.413298349, 50, 15.268230139),
        (36.413298349, 32.5, -2.231769861),
        (36.413298349, 27.5, -42.231769861),
        (36.413298349, 27.5, -7.231769861),
        (36.413298349, 10, -24.731769861),
        (36.413298349, 32.5, -47.231769861),
        (36.413298349, 50, -64.731769861),
        (36.413298349, 67.5, -47.231769861),
    ]]
    fillet(fillet114_edges, radius=FILLET114_R)

    # Sketch28 → Boss-Extrude13 (add)
    with BuildSketch(Plane(origin=(-53.586701651, 0, 0), x_dir=(0, 0, -1), z_dir=(1, 0, 0))):
        with Locations(Location((27.231769861, 50, 0), (0, 0, 180))):
            Circle(SKETCH28_R)
    extrude(amount=BOSS_EXTRUDE13_DEPTH)

    # Sketch29 → Boss-Extrude14 (add)
    with BuildSketch(Plane(origin=(-53.586701651, 0, 0), x_dir=(0, 0, -1), z_dir=(1, 0, 0))):
        with BuildLine():
            Line((38.705437833, 59.662036187), (42.529993823, 62.882714916))
            ThreePointArc((42.529993823, 62.882714916), (27.231769861, 70), (11.933545899, 62.882714916))
            Line((11.933545899, 62.882714916), (15.758101889, 59.662036187))
            ThreePointArc((15.758101889, 59.662036187), (27.231769861, 65), (38.705437833, 59.662036187))
        make_face()
        with BuildLine():
            Line((38.705437833, 40.337963813), (42.529993823, 37.117285084))
            ThreePointArc((42.529993823, 37.117285084), (27.231769861, 30), (11.933545899, 37.117285084))
            Line((11.933545899, 37.117285084), (15.758101889, 40.337963813))
            ThreePointArc((15.758101889, 40.337963813), (27.231769861, 35), (38.705437833, 40.337963813))
        make_face()
    extrude(amount=BOSS_EXTRUDE14_DEPTH)

    # Fillet115
    fillet115_edges = [part.edges().sort_by_distance(p)[0] for p in [
        (-53.586701651, 100, -24.731769861),
        (-13.586701651, 100, 15.268230139),
        (-31.086701651, 100, -2.231769861),
        (3.913298349, 100, -2.231769861),
        (10.665798349, 100, -5.479269861),
        (10.665798349, 100, -43.984269861),
        (3.913298349, 100, -47.231769861),
        (-13.586701651, 100, -64.731769861),
        (-31.086701651, 100, -47.231769861),
        (-36.086701651, 100, -42.231769861),
        (-36.086701651, 100, -7.231769861),
    ]]
    fillet(fillet115_edges, radius=FILLET115_R)


solid = part.part
